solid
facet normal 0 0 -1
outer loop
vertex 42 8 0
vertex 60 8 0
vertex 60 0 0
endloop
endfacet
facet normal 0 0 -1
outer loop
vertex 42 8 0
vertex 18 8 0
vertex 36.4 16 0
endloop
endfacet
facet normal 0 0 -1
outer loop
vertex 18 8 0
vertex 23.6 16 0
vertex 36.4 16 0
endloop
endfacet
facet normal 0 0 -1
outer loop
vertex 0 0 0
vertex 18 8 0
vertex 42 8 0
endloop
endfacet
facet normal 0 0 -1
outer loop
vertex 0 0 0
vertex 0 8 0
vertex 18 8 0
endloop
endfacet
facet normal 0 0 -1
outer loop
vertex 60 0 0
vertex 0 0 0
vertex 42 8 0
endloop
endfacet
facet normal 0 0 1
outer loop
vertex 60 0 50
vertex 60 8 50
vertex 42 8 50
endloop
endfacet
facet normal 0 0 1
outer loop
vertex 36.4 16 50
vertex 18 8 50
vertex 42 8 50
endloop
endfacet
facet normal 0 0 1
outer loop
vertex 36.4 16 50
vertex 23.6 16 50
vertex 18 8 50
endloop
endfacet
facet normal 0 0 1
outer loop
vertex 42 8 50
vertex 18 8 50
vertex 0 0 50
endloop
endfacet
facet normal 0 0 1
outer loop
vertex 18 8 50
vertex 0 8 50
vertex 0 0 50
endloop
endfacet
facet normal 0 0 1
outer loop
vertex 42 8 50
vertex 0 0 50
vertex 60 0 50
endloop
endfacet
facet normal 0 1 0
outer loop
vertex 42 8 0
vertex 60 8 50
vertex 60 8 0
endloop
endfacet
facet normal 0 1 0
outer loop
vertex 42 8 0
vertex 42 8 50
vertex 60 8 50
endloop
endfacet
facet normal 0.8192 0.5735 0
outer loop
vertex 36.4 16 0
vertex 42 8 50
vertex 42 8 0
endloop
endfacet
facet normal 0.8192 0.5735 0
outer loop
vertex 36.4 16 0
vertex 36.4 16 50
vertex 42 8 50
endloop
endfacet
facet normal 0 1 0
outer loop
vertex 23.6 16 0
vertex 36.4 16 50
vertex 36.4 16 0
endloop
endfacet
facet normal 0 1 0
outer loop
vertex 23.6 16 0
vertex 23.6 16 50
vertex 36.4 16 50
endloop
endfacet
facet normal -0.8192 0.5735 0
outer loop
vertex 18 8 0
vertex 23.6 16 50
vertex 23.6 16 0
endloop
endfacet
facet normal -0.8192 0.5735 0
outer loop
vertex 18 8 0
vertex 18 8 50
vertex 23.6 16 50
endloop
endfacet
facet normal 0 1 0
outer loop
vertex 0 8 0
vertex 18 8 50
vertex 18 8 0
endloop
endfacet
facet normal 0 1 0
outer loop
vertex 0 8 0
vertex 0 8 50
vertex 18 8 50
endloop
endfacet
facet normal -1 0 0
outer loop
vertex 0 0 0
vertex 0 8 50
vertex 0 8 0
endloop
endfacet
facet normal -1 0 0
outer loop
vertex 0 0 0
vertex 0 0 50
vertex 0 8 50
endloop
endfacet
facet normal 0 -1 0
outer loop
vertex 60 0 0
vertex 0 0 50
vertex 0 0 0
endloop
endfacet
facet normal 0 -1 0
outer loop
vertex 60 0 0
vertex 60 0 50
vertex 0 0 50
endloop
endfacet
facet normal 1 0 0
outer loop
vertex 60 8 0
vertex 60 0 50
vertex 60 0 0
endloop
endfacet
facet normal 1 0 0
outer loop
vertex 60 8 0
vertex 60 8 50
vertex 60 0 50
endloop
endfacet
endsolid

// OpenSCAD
$fn = 32;

// ----------------------------------------------------------------------
// V guide rail: dovetail, 60 mm wide
// ----------------------------------------------------------------------

// --- parameters (mm) ---
rail_w = 60;              // rail width, X
base_t = 8;               // base plate thickness
v_depth = 8;              // V feature depth / height
v_half_w = 12;            // half width of the V at the base face
plate_t = 50;             // rail length, Z (the extrusion height)
top_half_w = 6.4;         // half width at the dovetail top

dovetail_base = 2 * v_half_w;  // dovetail width at the base
dovetail_top = 2 * top_half_w;  // dovetail width at the top

profile = [[0, 0], [60, 0], [60, 8], [42, 8], [36.4, 16], [23.6, 16], [18, 8], [0, 8]];  // primary outline, 8 points, counter clockwise

// --- the one profile operation ---
linear_extrude(height = plate_t) polygon(points = profile);
